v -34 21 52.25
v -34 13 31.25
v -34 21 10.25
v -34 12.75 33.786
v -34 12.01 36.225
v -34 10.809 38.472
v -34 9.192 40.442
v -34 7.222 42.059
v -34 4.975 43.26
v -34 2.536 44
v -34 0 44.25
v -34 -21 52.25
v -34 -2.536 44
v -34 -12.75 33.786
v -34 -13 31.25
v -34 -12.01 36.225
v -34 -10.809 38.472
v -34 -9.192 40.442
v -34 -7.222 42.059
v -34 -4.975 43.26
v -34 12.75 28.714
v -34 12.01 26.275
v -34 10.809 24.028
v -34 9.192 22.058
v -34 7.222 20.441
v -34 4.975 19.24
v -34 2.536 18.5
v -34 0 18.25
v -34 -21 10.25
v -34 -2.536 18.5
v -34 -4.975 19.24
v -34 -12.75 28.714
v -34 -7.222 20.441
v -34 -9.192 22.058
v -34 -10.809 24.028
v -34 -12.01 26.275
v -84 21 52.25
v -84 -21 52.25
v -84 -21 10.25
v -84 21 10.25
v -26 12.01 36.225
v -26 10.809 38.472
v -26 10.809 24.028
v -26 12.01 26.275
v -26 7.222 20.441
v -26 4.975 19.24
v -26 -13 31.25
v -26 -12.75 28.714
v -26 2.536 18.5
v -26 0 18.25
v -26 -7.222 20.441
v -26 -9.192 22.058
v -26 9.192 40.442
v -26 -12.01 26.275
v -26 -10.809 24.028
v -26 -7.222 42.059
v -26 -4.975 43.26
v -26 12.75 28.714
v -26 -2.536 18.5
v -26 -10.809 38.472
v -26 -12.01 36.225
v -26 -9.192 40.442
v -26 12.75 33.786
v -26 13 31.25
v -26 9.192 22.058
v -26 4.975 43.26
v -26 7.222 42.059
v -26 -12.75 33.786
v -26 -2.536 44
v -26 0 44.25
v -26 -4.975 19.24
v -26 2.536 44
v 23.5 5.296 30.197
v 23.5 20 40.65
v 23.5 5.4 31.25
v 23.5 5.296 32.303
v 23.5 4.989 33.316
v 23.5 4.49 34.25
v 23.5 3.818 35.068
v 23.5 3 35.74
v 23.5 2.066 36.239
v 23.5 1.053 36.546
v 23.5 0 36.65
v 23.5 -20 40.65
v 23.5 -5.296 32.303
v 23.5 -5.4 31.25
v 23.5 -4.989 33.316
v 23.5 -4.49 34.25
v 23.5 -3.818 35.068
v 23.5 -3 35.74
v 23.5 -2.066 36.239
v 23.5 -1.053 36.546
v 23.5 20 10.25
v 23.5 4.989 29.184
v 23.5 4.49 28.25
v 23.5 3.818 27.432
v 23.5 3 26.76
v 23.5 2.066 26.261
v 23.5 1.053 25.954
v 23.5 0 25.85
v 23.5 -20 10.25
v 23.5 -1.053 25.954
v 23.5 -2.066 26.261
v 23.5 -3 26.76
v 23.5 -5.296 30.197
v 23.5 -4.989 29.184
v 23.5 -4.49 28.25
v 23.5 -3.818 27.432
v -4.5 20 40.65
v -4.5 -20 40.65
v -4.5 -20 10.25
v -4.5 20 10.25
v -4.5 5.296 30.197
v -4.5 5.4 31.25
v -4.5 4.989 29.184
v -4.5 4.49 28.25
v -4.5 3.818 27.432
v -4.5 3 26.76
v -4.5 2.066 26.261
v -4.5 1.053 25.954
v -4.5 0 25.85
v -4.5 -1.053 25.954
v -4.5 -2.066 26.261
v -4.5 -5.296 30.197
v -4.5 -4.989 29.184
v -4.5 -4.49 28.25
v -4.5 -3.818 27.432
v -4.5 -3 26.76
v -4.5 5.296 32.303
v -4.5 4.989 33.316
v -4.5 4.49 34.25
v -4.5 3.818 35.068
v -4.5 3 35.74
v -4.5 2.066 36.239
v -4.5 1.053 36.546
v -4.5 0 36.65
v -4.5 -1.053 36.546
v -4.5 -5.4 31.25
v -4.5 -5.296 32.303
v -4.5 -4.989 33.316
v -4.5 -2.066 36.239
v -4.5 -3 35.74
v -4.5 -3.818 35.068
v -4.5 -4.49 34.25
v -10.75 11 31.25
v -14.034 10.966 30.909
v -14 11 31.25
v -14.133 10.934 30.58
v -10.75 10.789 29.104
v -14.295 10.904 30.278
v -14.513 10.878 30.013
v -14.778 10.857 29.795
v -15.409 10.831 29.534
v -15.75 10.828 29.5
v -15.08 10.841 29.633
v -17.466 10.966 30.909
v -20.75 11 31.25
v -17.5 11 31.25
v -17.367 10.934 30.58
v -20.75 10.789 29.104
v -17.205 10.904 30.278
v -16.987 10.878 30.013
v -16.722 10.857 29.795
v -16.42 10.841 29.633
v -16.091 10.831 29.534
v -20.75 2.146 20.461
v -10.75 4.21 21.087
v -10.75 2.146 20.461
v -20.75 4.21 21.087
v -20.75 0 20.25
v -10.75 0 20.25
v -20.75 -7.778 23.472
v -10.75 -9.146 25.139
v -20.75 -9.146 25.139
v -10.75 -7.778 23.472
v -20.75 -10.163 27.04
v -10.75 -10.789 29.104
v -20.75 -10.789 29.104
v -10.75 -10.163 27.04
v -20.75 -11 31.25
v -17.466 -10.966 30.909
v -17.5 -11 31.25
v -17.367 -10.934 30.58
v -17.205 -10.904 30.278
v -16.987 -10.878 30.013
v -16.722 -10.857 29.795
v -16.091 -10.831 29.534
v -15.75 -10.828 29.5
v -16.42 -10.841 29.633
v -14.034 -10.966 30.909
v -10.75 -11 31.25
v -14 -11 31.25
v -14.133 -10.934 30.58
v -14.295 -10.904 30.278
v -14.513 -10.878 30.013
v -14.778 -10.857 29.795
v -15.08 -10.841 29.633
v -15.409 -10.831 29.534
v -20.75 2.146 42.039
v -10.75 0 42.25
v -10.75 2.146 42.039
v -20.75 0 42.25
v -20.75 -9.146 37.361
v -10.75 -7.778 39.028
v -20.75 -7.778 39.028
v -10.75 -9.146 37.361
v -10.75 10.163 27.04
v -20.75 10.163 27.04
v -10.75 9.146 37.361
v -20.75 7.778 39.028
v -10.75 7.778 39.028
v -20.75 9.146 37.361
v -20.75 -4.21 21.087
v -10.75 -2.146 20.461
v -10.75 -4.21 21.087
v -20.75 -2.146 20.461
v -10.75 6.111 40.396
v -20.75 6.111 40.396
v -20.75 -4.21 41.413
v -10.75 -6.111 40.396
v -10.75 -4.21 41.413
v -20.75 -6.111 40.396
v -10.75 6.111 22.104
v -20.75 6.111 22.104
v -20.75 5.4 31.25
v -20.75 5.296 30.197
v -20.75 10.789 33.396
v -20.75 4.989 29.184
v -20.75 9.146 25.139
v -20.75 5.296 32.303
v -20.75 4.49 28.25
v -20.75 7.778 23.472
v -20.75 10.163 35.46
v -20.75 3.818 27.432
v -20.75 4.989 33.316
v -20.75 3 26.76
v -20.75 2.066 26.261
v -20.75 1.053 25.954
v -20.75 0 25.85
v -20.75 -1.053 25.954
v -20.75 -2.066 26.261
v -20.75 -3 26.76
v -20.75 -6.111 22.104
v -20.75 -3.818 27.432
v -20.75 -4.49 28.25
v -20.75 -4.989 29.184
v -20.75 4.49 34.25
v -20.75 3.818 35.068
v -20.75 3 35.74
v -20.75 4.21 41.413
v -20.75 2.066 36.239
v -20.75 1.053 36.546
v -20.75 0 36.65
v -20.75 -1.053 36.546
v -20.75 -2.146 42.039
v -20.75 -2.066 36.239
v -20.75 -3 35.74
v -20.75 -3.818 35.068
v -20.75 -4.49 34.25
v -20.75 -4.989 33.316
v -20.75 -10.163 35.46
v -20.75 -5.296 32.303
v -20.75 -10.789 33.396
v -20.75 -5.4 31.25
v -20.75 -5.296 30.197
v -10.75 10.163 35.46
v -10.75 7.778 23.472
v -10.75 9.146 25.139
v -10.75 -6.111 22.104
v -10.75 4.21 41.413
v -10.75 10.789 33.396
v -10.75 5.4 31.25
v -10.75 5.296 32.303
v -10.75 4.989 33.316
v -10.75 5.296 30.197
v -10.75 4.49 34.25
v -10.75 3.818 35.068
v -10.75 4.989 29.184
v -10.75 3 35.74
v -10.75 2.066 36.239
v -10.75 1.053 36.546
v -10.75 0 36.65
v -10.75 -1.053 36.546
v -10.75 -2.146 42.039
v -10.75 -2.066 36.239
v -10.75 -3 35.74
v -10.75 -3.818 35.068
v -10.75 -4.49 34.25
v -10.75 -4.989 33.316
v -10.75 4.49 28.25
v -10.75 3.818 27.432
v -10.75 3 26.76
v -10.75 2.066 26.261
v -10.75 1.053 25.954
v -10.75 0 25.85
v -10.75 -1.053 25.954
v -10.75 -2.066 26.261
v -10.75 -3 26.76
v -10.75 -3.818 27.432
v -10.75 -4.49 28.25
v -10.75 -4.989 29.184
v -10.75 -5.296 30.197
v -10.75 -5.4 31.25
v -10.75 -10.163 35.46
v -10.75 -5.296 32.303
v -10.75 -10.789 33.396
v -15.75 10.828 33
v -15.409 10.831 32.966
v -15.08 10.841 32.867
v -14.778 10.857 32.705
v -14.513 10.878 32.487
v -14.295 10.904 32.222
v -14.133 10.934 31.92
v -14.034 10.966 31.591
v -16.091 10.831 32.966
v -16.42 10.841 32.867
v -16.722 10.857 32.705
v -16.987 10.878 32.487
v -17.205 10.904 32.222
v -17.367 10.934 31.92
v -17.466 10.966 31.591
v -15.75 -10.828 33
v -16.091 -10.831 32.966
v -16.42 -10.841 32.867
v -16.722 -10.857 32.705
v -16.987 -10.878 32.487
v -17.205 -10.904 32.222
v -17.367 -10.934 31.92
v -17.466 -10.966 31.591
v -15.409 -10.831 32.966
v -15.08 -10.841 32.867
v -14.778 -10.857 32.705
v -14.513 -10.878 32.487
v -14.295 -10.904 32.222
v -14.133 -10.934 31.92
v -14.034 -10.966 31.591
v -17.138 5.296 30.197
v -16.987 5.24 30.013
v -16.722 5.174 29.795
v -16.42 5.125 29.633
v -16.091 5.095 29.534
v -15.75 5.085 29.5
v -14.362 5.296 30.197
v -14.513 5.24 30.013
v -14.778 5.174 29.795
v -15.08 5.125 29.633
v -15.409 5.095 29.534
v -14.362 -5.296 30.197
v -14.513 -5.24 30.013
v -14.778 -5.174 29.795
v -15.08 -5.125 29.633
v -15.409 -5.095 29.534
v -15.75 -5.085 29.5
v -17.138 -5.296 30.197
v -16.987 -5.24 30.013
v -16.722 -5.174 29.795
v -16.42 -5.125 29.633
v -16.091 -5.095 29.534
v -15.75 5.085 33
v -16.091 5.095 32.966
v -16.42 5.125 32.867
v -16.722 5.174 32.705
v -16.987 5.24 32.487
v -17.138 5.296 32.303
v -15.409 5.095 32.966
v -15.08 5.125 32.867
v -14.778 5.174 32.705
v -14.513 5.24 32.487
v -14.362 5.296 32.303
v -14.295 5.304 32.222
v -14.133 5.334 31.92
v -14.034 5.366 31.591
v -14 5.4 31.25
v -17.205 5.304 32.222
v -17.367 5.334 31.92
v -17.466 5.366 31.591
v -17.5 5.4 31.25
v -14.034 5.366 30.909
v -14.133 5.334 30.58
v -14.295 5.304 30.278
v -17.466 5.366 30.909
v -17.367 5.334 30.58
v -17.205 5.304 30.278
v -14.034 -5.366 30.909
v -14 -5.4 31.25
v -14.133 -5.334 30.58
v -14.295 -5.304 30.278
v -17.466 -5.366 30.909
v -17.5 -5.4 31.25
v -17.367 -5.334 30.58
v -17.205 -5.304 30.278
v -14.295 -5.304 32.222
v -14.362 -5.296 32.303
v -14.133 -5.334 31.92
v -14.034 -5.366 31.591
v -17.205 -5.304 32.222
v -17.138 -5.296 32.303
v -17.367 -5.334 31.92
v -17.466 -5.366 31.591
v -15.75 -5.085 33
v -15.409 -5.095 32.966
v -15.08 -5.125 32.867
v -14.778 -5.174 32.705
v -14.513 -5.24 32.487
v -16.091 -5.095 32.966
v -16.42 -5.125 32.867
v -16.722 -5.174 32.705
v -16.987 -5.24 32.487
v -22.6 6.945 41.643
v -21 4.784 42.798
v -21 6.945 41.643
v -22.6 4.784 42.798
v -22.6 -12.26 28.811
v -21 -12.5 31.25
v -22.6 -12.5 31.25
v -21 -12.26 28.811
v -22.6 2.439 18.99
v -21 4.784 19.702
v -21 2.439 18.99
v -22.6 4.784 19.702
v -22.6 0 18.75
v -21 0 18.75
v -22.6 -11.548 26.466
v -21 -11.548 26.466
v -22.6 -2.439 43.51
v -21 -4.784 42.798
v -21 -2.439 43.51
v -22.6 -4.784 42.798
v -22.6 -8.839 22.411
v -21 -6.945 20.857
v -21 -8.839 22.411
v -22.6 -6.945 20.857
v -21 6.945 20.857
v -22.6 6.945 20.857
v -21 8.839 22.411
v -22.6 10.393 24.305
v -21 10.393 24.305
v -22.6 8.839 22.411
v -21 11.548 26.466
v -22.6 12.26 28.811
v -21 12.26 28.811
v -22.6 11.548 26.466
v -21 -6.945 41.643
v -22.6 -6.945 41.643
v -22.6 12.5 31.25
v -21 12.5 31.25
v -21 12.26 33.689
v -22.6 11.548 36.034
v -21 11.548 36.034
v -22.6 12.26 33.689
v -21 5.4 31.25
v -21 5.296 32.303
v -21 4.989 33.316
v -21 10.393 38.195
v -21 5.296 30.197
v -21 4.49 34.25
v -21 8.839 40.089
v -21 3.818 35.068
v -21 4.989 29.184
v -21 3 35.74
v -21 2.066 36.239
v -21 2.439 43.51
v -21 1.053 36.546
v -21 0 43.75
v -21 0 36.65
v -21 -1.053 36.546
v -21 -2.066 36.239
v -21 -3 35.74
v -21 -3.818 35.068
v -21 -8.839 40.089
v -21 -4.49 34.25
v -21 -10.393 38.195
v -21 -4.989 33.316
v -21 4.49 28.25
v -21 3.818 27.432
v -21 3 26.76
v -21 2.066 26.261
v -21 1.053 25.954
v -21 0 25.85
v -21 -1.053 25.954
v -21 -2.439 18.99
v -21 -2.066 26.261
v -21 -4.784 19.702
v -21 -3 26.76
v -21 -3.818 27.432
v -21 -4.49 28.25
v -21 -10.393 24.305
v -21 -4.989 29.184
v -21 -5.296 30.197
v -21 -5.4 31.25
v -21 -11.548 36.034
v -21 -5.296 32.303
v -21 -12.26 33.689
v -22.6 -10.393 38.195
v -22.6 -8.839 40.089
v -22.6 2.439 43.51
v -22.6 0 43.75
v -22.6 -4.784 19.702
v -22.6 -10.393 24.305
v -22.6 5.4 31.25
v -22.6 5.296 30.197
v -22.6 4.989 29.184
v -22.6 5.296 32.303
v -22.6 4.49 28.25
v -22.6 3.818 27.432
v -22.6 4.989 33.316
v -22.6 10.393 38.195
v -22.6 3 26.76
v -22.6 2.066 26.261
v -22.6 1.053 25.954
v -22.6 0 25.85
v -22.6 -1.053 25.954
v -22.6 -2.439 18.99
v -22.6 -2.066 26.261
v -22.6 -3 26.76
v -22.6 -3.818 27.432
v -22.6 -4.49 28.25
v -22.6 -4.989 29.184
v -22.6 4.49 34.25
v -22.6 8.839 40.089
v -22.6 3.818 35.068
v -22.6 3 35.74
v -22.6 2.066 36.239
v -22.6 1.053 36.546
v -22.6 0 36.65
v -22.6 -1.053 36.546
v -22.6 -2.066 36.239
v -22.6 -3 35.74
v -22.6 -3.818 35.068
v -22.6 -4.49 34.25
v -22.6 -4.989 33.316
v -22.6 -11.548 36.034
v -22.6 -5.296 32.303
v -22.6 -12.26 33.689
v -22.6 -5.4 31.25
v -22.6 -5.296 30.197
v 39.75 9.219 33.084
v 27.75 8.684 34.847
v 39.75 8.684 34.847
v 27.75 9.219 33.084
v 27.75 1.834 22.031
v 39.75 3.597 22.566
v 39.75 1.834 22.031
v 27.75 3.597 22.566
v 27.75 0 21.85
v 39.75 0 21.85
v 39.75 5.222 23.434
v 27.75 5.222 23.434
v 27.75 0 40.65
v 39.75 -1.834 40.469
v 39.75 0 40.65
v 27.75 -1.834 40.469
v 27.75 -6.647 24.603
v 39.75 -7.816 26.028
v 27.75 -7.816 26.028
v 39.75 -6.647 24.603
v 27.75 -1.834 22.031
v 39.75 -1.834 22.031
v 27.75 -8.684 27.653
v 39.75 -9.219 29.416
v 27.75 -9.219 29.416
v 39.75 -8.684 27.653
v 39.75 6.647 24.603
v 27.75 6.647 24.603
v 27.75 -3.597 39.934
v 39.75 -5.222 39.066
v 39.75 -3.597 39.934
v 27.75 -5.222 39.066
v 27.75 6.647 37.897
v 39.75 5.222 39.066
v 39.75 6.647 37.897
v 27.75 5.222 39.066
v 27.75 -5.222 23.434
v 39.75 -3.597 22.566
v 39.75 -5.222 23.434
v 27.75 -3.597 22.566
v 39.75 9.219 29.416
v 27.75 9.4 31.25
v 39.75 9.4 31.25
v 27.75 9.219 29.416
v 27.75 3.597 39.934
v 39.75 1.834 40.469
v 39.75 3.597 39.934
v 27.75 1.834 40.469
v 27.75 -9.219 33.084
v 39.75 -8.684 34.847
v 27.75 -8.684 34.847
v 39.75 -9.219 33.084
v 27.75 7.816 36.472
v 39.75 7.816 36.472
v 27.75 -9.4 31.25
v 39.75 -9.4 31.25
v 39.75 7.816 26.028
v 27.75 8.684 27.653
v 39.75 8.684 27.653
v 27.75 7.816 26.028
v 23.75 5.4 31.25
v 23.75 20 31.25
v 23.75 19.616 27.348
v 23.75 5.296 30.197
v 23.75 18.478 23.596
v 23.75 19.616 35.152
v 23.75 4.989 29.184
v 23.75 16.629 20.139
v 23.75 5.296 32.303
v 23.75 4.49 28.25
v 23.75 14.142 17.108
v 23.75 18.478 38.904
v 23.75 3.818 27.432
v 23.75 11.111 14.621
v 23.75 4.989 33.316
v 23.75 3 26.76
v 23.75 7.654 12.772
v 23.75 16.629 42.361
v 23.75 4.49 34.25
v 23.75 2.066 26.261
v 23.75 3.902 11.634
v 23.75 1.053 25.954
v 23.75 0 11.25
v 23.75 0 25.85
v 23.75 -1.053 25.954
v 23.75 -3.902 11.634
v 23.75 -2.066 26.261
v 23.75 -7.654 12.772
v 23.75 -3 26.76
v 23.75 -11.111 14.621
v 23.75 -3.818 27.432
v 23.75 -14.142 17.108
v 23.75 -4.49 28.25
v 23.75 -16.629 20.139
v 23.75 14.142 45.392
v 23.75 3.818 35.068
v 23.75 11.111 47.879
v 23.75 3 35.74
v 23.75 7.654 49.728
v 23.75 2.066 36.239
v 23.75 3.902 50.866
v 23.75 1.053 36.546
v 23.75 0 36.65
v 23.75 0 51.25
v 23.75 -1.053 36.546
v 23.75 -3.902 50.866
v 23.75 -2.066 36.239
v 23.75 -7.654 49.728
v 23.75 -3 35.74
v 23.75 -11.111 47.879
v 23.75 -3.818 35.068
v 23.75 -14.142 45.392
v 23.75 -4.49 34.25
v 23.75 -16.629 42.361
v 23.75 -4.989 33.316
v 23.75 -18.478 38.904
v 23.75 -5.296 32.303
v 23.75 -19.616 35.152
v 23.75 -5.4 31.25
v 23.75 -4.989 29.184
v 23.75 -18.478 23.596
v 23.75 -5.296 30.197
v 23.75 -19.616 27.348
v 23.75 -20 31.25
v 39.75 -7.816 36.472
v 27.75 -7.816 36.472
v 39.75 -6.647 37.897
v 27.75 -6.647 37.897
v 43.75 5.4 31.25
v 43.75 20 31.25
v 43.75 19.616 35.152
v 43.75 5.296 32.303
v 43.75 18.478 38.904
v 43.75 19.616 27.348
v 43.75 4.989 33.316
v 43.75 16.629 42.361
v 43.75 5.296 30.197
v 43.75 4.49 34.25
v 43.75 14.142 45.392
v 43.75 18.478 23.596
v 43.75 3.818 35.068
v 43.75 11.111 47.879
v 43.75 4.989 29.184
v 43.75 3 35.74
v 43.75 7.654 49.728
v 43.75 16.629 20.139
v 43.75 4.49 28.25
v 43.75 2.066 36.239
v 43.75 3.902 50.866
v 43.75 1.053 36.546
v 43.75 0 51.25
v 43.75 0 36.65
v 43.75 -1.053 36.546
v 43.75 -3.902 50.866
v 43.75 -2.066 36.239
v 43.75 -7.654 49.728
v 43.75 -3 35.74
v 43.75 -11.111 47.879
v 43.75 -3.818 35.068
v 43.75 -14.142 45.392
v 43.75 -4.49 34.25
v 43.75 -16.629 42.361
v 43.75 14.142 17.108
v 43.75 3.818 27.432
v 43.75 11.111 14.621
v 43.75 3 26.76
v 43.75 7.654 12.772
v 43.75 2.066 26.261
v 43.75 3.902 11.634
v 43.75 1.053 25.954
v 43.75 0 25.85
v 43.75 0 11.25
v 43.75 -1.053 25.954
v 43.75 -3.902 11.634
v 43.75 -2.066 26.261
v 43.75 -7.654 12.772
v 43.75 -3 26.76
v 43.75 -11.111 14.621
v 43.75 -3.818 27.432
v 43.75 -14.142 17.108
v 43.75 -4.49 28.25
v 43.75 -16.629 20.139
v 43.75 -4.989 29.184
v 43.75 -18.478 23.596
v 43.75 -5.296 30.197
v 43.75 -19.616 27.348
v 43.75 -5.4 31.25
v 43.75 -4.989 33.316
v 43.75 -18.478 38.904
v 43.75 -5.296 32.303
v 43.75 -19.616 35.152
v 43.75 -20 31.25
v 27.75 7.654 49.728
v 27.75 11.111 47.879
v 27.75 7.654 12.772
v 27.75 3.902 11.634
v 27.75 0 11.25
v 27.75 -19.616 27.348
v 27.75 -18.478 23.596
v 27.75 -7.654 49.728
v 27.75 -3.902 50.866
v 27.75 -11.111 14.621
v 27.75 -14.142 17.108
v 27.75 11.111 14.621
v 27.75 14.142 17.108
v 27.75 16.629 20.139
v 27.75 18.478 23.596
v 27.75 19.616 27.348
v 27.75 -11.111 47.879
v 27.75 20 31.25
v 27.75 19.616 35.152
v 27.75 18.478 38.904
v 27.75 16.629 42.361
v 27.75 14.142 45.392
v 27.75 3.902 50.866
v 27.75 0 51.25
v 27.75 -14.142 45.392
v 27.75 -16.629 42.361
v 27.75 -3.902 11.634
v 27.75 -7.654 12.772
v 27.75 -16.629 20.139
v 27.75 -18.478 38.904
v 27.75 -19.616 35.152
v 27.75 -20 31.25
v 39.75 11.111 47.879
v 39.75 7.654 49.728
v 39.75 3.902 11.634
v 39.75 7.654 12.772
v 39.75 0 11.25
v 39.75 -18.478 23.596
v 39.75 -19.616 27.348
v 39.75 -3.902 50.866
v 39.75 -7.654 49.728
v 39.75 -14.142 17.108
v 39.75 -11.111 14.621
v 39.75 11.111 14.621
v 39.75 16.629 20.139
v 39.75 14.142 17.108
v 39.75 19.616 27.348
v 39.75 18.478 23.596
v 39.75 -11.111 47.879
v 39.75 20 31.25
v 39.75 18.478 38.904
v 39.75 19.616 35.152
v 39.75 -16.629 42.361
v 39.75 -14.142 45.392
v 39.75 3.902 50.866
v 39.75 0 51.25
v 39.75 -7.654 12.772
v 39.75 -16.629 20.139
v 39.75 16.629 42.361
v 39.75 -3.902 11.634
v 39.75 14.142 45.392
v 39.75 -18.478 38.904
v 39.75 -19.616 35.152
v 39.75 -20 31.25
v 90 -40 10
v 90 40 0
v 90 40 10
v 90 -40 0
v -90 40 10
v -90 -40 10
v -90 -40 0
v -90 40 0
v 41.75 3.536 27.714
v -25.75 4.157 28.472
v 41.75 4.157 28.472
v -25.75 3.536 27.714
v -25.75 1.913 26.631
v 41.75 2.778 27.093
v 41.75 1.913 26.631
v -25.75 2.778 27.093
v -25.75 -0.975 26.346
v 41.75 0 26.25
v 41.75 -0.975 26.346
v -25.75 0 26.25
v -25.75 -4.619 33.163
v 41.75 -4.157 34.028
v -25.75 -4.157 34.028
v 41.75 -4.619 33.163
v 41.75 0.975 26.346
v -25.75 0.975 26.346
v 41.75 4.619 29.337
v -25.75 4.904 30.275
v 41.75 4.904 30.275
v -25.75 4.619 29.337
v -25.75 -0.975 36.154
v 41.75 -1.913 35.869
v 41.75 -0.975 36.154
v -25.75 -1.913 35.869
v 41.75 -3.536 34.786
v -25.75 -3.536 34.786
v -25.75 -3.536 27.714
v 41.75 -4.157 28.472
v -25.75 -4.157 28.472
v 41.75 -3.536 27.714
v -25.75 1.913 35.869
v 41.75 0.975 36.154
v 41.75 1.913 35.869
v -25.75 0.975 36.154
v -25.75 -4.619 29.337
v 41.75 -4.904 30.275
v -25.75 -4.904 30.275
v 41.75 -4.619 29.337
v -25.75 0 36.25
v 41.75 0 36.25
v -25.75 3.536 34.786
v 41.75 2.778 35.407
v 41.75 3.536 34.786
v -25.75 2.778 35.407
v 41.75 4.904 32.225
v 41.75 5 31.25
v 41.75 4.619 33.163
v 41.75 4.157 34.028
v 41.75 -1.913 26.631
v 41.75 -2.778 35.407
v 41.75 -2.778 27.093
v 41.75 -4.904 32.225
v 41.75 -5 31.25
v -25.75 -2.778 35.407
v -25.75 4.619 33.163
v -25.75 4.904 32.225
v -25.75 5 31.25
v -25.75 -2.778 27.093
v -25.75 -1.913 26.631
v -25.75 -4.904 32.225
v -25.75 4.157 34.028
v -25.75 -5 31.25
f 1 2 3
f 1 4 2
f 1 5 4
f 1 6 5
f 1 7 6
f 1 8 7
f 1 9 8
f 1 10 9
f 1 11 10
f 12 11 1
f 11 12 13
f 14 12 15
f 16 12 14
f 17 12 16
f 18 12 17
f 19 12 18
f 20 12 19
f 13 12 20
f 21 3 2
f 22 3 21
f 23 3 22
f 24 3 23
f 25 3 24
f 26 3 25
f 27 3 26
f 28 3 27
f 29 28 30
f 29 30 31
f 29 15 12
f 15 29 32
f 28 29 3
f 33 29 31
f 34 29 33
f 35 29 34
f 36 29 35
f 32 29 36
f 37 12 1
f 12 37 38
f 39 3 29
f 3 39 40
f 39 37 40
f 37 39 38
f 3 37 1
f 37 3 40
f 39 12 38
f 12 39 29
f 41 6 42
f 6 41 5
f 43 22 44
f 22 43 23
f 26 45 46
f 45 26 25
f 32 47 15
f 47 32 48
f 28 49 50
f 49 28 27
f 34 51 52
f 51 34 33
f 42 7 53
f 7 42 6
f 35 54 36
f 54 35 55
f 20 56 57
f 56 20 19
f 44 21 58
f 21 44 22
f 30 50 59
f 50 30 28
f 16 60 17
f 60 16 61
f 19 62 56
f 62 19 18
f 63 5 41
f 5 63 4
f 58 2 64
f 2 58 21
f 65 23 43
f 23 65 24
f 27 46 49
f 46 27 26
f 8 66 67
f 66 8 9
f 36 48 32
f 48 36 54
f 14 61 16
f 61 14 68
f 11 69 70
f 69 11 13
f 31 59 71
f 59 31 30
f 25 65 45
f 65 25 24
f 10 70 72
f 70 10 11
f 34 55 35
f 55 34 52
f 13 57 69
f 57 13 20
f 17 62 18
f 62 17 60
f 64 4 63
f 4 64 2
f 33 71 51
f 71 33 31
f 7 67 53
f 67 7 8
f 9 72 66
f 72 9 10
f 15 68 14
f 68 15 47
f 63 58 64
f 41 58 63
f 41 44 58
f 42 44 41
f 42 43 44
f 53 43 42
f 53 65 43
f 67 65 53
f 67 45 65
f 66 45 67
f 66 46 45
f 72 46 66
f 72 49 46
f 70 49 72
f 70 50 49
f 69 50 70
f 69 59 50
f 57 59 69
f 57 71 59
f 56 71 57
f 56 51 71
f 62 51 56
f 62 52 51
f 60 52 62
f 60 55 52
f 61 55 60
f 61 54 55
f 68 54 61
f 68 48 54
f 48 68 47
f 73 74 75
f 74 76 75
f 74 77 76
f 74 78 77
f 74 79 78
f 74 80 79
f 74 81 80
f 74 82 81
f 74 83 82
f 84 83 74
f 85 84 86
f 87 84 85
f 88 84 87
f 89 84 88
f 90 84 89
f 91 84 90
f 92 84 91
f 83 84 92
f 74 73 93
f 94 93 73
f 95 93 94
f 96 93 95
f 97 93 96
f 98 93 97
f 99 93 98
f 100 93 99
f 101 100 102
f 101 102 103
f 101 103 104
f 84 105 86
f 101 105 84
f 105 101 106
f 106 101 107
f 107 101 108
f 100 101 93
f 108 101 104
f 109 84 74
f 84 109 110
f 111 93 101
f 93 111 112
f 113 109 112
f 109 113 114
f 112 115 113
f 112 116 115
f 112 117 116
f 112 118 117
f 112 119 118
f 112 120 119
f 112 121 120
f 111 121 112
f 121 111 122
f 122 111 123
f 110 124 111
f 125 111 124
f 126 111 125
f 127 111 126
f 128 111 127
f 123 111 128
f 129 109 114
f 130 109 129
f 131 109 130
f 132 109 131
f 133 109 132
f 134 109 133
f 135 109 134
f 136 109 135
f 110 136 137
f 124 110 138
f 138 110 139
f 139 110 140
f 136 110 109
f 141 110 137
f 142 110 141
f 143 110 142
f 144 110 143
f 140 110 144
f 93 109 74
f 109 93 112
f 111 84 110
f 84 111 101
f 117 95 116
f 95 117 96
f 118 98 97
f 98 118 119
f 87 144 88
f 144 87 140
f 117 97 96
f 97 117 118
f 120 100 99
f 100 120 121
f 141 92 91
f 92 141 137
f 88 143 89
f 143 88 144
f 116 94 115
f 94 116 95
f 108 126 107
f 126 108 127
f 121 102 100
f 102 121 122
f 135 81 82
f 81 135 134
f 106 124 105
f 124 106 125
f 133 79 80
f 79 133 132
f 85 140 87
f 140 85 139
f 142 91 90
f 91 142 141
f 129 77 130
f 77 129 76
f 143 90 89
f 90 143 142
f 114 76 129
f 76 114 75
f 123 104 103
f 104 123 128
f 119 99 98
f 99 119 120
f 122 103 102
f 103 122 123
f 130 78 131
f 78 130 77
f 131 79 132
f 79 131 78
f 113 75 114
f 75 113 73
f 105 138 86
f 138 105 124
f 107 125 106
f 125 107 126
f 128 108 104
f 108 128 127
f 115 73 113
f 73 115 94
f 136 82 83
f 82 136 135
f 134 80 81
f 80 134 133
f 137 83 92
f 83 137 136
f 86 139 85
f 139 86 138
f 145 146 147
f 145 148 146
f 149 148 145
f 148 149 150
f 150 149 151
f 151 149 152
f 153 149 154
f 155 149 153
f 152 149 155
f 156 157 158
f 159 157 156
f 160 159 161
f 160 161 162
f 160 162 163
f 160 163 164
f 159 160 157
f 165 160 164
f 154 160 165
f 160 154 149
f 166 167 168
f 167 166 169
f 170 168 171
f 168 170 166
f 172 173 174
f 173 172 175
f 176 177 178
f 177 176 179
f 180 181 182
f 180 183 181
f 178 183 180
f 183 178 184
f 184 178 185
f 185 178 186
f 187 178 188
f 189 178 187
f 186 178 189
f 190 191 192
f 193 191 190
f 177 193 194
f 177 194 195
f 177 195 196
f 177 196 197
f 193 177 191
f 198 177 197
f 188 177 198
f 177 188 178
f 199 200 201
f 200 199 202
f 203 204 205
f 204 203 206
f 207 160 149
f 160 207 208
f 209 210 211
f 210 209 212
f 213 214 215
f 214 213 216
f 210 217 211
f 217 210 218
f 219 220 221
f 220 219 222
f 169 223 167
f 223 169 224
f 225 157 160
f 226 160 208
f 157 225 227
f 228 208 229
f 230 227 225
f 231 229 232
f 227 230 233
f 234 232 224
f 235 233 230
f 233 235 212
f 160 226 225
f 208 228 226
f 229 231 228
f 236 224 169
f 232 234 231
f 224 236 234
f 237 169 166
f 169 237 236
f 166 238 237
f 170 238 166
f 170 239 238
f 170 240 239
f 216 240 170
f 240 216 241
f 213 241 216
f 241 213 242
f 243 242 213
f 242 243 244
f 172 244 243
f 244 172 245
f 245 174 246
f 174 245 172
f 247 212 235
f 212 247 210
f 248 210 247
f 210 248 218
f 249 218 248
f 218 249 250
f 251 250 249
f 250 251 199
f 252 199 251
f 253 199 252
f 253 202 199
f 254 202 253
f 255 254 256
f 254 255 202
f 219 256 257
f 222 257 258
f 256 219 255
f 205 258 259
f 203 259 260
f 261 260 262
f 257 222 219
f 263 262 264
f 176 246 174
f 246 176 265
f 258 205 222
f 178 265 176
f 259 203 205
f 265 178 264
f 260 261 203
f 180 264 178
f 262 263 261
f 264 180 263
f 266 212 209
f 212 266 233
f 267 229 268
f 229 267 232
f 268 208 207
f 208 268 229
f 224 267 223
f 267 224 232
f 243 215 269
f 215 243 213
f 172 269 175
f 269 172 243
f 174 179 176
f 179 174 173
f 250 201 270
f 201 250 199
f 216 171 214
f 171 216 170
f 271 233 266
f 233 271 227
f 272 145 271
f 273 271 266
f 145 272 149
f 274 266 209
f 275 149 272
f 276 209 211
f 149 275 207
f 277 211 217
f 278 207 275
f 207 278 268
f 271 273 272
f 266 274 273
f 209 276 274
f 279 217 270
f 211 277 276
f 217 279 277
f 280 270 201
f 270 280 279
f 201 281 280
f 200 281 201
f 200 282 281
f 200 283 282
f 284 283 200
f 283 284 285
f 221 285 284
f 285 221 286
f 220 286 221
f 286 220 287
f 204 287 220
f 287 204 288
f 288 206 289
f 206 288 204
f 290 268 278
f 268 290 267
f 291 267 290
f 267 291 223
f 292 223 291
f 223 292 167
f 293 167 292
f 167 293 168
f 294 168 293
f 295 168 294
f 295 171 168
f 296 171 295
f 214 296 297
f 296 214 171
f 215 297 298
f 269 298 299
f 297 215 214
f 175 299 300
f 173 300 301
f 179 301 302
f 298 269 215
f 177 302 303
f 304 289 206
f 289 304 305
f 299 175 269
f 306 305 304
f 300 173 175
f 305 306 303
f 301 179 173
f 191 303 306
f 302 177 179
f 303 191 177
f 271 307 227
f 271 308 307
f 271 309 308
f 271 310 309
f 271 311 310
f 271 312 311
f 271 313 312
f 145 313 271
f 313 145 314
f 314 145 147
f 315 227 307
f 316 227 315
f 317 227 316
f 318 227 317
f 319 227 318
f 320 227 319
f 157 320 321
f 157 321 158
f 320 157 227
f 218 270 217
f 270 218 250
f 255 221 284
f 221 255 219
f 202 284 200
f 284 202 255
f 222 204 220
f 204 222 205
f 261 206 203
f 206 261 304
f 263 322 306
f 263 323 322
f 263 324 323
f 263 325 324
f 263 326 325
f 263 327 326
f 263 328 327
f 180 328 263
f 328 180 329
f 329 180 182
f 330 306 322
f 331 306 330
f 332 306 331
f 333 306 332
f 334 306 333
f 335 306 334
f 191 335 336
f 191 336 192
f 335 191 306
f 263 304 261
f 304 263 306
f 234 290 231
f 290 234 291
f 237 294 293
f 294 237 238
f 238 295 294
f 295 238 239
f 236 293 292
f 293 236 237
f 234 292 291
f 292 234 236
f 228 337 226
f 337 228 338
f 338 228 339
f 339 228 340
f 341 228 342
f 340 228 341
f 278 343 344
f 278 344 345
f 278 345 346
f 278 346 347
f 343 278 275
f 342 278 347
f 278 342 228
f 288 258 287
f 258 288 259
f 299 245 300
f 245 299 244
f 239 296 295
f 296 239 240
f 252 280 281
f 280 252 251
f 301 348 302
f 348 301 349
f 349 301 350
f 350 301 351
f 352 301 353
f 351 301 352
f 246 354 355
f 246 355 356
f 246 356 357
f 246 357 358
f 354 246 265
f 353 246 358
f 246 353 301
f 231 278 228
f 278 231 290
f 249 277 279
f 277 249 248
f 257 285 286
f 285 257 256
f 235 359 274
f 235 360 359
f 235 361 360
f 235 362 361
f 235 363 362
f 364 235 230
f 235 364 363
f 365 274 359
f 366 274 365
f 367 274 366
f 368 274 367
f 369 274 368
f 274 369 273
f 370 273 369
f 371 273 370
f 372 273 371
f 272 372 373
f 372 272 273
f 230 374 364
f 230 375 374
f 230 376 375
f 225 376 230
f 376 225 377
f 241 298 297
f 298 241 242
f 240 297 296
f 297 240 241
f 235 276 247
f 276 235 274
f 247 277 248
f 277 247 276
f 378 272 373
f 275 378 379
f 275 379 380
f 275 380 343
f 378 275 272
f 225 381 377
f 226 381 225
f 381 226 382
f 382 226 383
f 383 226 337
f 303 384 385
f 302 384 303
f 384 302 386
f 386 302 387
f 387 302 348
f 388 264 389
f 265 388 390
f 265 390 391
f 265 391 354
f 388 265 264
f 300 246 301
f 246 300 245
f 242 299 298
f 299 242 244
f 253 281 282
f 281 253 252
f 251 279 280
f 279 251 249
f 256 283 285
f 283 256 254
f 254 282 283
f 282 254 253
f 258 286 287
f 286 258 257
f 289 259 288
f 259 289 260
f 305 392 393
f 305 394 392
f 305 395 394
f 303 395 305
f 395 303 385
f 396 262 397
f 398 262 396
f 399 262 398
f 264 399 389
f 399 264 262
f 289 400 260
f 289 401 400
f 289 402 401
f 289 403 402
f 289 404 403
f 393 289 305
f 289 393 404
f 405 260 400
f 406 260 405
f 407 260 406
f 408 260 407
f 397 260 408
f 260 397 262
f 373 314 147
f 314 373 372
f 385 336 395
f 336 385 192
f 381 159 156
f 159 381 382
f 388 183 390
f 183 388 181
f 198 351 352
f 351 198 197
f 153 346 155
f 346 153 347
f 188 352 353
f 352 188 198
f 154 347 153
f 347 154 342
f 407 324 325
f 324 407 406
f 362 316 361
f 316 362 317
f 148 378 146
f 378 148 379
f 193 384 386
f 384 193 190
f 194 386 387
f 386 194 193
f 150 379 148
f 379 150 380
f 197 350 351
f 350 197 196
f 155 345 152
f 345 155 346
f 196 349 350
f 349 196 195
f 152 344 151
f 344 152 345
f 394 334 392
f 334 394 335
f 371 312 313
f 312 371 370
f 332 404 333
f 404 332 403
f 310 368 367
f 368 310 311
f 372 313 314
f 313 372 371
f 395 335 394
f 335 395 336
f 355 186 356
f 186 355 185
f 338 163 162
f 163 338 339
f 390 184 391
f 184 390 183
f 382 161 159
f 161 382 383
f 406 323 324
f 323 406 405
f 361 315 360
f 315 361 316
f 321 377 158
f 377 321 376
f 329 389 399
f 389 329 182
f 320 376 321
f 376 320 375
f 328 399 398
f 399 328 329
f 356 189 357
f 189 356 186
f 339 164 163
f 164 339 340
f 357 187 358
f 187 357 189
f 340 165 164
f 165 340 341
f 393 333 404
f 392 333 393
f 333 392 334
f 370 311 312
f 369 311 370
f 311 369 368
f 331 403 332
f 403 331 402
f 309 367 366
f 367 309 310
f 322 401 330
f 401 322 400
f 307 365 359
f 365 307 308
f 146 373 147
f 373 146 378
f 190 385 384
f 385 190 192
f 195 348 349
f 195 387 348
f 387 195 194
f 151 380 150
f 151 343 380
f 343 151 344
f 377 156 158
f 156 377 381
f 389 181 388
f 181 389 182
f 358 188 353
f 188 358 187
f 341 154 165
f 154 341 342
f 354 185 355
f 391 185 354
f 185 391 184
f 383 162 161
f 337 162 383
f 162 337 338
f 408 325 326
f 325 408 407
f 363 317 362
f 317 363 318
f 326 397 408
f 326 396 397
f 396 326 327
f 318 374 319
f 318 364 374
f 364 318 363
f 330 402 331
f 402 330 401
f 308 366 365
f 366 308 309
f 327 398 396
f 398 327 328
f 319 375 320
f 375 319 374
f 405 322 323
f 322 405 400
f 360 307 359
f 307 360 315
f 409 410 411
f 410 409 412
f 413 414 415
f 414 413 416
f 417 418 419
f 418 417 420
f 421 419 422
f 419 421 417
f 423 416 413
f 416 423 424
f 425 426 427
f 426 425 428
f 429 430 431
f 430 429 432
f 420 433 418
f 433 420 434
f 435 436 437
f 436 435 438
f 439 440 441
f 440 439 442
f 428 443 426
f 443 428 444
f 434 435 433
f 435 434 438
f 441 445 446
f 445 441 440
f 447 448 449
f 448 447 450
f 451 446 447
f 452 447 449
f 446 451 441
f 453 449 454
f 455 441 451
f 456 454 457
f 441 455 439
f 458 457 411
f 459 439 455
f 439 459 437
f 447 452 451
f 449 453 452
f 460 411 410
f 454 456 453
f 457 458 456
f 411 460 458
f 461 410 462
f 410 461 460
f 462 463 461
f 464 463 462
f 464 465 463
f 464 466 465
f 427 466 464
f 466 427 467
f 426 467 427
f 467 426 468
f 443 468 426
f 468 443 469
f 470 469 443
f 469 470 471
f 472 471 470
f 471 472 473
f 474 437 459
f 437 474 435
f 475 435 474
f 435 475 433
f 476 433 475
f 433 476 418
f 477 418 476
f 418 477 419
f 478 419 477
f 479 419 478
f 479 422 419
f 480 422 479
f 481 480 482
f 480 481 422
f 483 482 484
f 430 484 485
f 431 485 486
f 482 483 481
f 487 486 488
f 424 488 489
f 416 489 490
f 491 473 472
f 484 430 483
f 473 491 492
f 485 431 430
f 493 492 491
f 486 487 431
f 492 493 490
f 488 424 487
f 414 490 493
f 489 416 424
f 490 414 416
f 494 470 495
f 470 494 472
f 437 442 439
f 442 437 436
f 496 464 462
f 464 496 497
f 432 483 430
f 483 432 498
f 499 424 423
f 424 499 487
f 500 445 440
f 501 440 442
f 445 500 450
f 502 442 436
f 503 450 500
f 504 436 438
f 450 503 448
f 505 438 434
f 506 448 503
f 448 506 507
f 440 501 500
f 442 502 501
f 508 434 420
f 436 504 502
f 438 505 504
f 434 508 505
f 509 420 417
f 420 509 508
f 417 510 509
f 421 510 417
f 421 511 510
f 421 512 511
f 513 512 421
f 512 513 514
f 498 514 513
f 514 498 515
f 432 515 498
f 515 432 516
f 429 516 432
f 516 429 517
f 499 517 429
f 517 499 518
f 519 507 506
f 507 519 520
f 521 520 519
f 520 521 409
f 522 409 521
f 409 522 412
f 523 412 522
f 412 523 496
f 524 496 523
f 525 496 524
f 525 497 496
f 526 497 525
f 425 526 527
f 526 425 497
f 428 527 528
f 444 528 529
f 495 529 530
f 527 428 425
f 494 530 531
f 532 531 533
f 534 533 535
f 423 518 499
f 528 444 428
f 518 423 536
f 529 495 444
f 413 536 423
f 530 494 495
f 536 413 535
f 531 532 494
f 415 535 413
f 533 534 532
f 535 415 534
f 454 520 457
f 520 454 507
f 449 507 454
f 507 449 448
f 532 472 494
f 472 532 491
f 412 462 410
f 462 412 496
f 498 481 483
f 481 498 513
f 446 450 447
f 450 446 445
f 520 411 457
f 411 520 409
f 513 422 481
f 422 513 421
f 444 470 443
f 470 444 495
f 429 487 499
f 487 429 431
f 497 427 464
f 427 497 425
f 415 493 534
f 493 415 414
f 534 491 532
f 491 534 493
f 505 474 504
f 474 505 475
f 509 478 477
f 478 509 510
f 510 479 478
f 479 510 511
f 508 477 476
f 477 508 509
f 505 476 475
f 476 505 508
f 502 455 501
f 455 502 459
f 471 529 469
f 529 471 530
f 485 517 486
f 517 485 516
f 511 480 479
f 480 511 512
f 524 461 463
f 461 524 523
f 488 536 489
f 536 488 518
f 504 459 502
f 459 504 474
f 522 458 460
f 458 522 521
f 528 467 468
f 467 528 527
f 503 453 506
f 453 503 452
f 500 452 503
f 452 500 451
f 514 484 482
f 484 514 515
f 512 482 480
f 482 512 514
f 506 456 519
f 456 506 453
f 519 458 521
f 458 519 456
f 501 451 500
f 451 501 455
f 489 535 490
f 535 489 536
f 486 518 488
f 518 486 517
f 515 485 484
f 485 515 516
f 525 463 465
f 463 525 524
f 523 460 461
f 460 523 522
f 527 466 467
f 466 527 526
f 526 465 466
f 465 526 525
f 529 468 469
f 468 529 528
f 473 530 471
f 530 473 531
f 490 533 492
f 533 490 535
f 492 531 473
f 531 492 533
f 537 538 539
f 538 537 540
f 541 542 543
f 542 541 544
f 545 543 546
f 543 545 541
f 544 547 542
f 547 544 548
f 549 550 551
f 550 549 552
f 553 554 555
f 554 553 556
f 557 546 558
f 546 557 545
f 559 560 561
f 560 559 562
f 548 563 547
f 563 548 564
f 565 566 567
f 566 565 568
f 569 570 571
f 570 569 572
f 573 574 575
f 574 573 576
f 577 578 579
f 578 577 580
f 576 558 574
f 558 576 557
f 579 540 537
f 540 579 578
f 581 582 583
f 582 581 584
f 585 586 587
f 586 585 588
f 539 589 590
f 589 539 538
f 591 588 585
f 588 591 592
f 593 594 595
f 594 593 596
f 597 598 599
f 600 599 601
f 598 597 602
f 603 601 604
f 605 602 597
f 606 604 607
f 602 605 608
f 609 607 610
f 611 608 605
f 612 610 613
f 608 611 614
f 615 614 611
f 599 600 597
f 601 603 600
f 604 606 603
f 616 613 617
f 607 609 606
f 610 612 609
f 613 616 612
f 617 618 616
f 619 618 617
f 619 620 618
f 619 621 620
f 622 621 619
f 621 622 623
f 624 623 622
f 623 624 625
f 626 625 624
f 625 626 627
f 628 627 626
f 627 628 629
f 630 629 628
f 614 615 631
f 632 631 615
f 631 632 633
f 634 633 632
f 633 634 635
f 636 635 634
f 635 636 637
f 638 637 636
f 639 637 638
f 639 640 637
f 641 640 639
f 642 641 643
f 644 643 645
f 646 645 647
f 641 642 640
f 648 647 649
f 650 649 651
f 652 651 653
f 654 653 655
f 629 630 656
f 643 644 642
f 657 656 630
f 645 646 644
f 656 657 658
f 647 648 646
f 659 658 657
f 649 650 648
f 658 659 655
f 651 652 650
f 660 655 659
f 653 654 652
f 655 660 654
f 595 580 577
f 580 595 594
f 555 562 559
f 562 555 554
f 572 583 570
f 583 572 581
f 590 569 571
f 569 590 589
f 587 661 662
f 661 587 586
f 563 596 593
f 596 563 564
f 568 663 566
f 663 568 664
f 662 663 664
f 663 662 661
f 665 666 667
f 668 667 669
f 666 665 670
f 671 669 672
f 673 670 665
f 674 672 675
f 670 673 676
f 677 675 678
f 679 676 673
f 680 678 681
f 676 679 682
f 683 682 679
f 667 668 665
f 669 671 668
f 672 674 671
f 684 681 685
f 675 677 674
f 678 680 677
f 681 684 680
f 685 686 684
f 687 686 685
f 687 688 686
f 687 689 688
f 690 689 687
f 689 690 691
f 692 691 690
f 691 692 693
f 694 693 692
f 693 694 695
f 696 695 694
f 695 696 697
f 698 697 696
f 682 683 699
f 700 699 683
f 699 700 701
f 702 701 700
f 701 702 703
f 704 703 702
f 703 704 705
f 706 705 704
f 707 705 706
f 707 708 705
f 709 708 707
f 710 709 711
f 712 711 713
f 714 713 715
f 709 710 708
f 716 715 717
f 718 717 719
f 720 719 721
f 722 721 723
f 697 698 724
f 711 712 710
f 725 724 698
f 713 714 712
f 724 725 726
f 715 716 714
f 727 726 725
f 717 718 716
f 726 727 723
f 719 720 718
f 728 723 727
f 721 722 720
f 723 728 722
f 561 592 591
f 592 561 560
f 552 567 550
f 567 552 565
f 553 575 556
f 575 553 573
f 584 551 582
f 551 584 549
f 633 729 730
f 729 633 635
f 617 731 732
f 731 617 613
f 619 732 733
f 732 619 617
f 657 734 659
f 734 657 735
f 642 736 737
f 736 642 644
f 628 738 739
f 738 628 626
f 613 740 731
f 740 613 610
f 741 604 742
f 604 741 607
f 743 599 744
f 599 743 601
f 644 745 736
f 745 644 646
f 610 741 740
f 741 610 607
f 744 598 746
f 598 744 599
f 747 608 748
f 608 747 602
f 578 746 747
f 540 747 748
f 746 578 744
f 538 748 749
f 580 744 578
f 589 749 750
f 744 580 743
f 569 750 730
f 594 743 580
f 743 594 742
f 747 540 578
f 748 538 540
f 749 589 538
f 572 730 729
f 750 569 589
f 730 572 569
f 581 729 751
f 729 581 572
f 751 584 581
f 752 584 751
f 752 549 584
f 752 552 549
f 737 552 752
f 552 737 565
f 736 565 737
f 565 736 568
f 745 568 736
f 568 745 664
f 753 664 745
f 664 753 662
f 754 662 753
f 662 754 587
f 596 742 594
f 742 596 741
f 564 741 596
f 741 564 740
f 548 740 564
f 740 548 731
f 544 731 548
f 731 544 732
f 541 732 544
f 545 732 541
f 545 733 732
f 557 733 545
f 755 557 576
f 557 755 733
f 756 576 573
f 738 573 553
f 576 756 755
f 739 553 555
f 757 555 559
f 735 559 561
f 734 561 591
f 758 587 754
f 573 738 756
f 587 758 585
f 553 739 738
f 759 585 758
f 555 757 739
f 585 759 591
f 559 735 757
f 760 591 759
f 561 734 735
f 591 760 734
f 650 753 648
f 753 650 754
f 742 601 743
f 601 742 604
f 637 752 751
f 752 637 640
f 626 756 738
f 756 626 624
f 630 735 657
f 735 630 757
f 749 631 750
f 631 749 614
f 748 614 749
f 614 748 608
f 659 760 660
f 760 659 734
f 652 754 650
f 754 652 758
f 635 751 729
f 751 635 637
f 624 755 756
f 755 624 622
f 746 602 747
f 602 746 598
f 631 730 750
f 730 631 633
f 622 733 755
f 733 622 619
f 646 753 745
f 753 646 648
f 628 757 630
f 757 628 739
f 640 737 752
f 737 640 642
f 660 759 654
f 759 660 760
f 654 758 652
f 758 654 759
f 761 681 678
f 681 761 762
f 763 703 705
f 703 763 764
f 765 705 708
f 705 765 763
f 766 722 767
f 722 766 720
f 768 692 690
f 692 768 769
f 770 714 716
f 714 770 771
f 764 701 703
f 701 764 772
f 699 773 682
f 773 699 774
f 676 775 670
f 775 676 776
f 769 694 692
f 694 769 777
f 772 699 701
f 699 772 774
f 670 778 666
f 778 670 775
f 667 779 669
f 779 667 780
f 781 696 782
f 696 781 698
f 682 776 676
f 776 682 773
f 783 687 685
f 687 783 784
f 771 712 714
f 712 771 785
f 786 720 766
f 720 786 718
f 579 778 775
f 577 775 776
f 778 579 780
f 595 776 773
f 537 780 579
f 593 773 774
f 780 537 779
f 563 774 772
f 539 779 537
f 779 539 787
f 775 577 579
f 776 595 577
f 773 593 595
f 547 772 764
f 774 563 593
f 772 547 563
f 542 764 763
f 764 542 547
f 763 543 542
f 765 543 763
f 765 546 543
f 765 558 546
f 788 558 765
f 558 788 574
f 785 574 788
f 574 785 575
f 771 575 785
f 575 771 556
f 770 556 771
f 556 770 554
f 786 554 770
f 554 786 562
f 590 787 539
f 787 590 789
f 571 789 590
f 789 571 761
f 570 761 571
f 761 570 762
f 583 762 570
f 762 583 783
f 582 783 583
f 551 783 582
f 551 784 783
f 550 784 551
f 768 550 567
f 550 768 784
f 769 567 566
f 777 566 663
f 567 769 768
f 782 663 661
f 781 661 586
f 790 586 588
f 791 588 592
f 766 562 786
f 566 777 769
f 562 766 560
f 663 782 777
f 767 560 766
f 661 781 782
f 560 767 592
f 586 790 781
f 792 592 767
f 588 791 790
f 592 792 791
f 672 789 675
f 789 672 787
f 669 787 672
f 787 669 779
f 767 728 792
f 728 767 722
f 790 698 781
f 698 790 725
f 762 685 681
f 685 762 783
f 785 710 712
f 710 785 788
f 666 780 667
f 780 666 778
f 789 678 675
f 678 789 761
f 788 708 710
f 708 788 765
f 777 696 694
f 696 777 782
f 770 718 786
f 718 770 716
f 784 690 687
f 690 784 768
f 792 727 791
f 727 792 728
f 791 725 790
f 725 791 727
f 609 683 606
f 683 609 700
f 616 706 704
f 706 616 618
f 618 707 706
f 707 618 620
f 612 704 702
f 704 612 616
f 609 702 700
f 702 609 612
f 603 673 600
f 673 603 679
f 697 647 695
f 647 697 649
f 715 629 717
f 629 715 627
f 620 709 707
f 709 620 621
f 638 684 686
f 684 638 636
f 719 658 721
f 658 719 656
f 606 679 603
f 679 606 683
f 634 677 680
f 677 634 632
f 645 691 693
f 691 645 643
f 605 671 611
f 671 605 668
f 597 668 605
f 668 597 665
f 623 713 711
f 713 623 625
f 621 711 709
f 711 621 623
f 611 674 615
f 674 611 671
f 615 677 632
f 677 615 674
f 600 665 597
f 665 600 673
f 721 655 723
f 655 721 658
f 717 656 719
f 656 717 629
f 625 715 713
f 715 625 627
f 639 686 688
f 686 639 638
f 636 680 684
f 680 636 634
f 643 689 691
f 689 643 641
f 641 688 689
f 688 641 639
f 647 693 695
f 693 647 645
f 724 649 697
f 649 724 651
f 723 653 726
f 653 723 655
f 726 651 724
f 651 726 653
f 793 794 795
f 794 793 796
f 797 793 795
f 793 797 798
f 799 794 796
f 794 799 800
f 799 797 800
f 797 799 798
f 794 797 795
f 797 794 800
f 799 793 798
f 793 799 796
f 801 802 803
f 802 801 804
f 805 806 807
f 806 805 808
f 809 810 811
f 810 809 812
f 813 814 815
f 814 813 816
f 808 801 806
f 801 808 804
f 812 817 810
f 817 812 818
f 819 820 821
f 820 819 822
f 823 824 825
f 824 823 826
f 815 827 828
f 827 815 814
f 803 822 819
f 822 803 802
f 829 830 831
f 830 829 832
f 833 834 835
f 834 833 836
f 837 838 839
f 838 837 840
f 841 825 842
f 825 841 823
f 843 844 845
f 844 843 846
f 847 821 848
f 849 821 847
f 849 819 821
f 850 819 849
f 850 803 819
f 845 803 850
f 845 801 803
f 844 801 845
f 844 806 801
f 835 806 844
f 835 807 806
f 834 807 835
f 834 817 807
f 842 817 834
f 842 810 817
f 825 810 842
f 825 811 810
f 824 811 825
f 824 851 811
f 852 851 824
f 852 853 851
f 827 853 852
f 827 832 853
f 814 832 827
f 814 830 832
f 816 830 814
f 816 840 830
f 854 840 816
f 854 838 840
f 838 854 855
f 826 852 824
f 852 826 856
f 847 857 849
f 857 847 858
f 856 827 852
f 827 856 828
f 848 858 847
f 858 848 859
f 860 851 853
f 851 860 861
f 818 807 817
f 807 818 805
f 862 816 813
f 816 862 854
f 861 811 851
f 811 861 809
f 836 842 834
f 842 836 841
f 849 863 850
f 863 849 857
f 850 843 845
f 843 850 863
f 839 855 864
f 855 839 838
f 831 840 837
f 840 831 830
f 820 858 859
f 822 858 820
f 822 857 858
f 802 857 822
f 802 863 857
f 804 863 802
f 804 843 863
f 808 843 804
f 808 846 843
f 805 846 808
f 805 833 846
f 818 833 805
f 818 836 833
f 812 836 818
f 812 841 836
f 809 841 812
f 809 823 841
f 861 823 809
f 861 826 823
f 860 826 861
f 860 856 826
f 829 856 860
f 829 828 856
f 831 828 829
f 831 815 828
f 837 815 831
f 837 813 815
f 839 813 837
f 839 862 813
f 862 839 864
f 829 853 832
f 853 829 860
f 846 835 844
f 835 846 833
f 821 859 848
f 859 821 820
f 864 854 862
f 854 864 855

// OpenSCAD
$fn = 32;

// ------------------------------------------------------------------------
// Motor drive station: motor 50 x 42 mm, shaft d10, pulley d40
// Every part is its own module, assembly() places every instance.
// ------------------------------------------------------------------------

// --- part 1 ---
module station_bed() {
  difference() {
    translate([-90, -40, 0]) cube([180, 80, 10]);
  }
}

// --- part 2 ---
module drive_motor() {
  union() {
    translate([-25, -21, 0]) cube([50, 42, 42]);
    translate([29, 0, 21]) rotate([0, 90, 0]) cylinder(h = 8, d = 26, center = true);
  }
}

// --- part 3 ---
module pillow_block() {
  difference() {
    translate([-14, -20, 0]) cube([28, 40, 30.4]);
    translate([0, 0, 21]) rotate([0, 90, 0]) cylinder(h = 30, d = 10.8, center = true);
  }
}

// --- part 4 ---
module drive_shaft() {
  translate([0, 0, -33.75]) cylinder(h = 67.5, d = 10);
}

// --- part 5 ---
module shaft_collar() {
  difference() {
    cylinder(h = 10, d = 22);
    translate([0, 0, -1]) cylinder(h = 12, d = 10.8);
    translate([0, 0, 5]) rotate([90, 0, 0]) cylinder(h = 24, d = 3.5, center = true);
  }
}

// --- part 6 ---
module collar_washer() {
  difference() {
      translate([0, 0, 0]) cylinder(h = 1.6, d = 25);
      translate([0, 0, -1]) cylinder(h = 3.6, d = 10.8);
    }
}

// --- part 7 ---
module drive_pulley() {
  difference() {
    union() {
      cylinder(h = 20, d = 18.8);
      cylinder(h = 4, d = 40);
      translate([0, 0, 16]) cylinder(h = 4, d = 40);
    }
    translate([0, 0, -1]) cylinder(h = 22, d = 10.8);
  }
}

// --- assembly ---
module assembly() {
  color([0.80, 0.24, 0.20]) translate([0, 0, 0]) rotate([0, 0, 0]) station_bed();
  color([0.20, 0.45, 0.75]) translate([-59, 0, 10.25]) rotate([0, 0, 0]) drive_motor();
  color([0.25, 0.62, 0.32]) translate([9.5, 0, 10.25]) rotate([0, 0, 0]) pillow_block();
  color([0.92, 0.70, 0.18]) translate([8, 0, 31.25]) rotate([0, 90, 0]) drive_shaft();
  color([0.58, 0.35, 0.70]) translate([-20.75, 0, 31.25]) rotate([0, 90, 0]) shaft_collar();
  color([0.16, 0.66, 0.66]) translate([-22.6, 0, 31.25]) rotate([0, 90, 0]) collar_washer();
  color([0.85, 0.48, 0.18]) translate([23.75, 0, 31.25]) rotate([0, 90, 0]) drive_pulley();
}

assembly();
